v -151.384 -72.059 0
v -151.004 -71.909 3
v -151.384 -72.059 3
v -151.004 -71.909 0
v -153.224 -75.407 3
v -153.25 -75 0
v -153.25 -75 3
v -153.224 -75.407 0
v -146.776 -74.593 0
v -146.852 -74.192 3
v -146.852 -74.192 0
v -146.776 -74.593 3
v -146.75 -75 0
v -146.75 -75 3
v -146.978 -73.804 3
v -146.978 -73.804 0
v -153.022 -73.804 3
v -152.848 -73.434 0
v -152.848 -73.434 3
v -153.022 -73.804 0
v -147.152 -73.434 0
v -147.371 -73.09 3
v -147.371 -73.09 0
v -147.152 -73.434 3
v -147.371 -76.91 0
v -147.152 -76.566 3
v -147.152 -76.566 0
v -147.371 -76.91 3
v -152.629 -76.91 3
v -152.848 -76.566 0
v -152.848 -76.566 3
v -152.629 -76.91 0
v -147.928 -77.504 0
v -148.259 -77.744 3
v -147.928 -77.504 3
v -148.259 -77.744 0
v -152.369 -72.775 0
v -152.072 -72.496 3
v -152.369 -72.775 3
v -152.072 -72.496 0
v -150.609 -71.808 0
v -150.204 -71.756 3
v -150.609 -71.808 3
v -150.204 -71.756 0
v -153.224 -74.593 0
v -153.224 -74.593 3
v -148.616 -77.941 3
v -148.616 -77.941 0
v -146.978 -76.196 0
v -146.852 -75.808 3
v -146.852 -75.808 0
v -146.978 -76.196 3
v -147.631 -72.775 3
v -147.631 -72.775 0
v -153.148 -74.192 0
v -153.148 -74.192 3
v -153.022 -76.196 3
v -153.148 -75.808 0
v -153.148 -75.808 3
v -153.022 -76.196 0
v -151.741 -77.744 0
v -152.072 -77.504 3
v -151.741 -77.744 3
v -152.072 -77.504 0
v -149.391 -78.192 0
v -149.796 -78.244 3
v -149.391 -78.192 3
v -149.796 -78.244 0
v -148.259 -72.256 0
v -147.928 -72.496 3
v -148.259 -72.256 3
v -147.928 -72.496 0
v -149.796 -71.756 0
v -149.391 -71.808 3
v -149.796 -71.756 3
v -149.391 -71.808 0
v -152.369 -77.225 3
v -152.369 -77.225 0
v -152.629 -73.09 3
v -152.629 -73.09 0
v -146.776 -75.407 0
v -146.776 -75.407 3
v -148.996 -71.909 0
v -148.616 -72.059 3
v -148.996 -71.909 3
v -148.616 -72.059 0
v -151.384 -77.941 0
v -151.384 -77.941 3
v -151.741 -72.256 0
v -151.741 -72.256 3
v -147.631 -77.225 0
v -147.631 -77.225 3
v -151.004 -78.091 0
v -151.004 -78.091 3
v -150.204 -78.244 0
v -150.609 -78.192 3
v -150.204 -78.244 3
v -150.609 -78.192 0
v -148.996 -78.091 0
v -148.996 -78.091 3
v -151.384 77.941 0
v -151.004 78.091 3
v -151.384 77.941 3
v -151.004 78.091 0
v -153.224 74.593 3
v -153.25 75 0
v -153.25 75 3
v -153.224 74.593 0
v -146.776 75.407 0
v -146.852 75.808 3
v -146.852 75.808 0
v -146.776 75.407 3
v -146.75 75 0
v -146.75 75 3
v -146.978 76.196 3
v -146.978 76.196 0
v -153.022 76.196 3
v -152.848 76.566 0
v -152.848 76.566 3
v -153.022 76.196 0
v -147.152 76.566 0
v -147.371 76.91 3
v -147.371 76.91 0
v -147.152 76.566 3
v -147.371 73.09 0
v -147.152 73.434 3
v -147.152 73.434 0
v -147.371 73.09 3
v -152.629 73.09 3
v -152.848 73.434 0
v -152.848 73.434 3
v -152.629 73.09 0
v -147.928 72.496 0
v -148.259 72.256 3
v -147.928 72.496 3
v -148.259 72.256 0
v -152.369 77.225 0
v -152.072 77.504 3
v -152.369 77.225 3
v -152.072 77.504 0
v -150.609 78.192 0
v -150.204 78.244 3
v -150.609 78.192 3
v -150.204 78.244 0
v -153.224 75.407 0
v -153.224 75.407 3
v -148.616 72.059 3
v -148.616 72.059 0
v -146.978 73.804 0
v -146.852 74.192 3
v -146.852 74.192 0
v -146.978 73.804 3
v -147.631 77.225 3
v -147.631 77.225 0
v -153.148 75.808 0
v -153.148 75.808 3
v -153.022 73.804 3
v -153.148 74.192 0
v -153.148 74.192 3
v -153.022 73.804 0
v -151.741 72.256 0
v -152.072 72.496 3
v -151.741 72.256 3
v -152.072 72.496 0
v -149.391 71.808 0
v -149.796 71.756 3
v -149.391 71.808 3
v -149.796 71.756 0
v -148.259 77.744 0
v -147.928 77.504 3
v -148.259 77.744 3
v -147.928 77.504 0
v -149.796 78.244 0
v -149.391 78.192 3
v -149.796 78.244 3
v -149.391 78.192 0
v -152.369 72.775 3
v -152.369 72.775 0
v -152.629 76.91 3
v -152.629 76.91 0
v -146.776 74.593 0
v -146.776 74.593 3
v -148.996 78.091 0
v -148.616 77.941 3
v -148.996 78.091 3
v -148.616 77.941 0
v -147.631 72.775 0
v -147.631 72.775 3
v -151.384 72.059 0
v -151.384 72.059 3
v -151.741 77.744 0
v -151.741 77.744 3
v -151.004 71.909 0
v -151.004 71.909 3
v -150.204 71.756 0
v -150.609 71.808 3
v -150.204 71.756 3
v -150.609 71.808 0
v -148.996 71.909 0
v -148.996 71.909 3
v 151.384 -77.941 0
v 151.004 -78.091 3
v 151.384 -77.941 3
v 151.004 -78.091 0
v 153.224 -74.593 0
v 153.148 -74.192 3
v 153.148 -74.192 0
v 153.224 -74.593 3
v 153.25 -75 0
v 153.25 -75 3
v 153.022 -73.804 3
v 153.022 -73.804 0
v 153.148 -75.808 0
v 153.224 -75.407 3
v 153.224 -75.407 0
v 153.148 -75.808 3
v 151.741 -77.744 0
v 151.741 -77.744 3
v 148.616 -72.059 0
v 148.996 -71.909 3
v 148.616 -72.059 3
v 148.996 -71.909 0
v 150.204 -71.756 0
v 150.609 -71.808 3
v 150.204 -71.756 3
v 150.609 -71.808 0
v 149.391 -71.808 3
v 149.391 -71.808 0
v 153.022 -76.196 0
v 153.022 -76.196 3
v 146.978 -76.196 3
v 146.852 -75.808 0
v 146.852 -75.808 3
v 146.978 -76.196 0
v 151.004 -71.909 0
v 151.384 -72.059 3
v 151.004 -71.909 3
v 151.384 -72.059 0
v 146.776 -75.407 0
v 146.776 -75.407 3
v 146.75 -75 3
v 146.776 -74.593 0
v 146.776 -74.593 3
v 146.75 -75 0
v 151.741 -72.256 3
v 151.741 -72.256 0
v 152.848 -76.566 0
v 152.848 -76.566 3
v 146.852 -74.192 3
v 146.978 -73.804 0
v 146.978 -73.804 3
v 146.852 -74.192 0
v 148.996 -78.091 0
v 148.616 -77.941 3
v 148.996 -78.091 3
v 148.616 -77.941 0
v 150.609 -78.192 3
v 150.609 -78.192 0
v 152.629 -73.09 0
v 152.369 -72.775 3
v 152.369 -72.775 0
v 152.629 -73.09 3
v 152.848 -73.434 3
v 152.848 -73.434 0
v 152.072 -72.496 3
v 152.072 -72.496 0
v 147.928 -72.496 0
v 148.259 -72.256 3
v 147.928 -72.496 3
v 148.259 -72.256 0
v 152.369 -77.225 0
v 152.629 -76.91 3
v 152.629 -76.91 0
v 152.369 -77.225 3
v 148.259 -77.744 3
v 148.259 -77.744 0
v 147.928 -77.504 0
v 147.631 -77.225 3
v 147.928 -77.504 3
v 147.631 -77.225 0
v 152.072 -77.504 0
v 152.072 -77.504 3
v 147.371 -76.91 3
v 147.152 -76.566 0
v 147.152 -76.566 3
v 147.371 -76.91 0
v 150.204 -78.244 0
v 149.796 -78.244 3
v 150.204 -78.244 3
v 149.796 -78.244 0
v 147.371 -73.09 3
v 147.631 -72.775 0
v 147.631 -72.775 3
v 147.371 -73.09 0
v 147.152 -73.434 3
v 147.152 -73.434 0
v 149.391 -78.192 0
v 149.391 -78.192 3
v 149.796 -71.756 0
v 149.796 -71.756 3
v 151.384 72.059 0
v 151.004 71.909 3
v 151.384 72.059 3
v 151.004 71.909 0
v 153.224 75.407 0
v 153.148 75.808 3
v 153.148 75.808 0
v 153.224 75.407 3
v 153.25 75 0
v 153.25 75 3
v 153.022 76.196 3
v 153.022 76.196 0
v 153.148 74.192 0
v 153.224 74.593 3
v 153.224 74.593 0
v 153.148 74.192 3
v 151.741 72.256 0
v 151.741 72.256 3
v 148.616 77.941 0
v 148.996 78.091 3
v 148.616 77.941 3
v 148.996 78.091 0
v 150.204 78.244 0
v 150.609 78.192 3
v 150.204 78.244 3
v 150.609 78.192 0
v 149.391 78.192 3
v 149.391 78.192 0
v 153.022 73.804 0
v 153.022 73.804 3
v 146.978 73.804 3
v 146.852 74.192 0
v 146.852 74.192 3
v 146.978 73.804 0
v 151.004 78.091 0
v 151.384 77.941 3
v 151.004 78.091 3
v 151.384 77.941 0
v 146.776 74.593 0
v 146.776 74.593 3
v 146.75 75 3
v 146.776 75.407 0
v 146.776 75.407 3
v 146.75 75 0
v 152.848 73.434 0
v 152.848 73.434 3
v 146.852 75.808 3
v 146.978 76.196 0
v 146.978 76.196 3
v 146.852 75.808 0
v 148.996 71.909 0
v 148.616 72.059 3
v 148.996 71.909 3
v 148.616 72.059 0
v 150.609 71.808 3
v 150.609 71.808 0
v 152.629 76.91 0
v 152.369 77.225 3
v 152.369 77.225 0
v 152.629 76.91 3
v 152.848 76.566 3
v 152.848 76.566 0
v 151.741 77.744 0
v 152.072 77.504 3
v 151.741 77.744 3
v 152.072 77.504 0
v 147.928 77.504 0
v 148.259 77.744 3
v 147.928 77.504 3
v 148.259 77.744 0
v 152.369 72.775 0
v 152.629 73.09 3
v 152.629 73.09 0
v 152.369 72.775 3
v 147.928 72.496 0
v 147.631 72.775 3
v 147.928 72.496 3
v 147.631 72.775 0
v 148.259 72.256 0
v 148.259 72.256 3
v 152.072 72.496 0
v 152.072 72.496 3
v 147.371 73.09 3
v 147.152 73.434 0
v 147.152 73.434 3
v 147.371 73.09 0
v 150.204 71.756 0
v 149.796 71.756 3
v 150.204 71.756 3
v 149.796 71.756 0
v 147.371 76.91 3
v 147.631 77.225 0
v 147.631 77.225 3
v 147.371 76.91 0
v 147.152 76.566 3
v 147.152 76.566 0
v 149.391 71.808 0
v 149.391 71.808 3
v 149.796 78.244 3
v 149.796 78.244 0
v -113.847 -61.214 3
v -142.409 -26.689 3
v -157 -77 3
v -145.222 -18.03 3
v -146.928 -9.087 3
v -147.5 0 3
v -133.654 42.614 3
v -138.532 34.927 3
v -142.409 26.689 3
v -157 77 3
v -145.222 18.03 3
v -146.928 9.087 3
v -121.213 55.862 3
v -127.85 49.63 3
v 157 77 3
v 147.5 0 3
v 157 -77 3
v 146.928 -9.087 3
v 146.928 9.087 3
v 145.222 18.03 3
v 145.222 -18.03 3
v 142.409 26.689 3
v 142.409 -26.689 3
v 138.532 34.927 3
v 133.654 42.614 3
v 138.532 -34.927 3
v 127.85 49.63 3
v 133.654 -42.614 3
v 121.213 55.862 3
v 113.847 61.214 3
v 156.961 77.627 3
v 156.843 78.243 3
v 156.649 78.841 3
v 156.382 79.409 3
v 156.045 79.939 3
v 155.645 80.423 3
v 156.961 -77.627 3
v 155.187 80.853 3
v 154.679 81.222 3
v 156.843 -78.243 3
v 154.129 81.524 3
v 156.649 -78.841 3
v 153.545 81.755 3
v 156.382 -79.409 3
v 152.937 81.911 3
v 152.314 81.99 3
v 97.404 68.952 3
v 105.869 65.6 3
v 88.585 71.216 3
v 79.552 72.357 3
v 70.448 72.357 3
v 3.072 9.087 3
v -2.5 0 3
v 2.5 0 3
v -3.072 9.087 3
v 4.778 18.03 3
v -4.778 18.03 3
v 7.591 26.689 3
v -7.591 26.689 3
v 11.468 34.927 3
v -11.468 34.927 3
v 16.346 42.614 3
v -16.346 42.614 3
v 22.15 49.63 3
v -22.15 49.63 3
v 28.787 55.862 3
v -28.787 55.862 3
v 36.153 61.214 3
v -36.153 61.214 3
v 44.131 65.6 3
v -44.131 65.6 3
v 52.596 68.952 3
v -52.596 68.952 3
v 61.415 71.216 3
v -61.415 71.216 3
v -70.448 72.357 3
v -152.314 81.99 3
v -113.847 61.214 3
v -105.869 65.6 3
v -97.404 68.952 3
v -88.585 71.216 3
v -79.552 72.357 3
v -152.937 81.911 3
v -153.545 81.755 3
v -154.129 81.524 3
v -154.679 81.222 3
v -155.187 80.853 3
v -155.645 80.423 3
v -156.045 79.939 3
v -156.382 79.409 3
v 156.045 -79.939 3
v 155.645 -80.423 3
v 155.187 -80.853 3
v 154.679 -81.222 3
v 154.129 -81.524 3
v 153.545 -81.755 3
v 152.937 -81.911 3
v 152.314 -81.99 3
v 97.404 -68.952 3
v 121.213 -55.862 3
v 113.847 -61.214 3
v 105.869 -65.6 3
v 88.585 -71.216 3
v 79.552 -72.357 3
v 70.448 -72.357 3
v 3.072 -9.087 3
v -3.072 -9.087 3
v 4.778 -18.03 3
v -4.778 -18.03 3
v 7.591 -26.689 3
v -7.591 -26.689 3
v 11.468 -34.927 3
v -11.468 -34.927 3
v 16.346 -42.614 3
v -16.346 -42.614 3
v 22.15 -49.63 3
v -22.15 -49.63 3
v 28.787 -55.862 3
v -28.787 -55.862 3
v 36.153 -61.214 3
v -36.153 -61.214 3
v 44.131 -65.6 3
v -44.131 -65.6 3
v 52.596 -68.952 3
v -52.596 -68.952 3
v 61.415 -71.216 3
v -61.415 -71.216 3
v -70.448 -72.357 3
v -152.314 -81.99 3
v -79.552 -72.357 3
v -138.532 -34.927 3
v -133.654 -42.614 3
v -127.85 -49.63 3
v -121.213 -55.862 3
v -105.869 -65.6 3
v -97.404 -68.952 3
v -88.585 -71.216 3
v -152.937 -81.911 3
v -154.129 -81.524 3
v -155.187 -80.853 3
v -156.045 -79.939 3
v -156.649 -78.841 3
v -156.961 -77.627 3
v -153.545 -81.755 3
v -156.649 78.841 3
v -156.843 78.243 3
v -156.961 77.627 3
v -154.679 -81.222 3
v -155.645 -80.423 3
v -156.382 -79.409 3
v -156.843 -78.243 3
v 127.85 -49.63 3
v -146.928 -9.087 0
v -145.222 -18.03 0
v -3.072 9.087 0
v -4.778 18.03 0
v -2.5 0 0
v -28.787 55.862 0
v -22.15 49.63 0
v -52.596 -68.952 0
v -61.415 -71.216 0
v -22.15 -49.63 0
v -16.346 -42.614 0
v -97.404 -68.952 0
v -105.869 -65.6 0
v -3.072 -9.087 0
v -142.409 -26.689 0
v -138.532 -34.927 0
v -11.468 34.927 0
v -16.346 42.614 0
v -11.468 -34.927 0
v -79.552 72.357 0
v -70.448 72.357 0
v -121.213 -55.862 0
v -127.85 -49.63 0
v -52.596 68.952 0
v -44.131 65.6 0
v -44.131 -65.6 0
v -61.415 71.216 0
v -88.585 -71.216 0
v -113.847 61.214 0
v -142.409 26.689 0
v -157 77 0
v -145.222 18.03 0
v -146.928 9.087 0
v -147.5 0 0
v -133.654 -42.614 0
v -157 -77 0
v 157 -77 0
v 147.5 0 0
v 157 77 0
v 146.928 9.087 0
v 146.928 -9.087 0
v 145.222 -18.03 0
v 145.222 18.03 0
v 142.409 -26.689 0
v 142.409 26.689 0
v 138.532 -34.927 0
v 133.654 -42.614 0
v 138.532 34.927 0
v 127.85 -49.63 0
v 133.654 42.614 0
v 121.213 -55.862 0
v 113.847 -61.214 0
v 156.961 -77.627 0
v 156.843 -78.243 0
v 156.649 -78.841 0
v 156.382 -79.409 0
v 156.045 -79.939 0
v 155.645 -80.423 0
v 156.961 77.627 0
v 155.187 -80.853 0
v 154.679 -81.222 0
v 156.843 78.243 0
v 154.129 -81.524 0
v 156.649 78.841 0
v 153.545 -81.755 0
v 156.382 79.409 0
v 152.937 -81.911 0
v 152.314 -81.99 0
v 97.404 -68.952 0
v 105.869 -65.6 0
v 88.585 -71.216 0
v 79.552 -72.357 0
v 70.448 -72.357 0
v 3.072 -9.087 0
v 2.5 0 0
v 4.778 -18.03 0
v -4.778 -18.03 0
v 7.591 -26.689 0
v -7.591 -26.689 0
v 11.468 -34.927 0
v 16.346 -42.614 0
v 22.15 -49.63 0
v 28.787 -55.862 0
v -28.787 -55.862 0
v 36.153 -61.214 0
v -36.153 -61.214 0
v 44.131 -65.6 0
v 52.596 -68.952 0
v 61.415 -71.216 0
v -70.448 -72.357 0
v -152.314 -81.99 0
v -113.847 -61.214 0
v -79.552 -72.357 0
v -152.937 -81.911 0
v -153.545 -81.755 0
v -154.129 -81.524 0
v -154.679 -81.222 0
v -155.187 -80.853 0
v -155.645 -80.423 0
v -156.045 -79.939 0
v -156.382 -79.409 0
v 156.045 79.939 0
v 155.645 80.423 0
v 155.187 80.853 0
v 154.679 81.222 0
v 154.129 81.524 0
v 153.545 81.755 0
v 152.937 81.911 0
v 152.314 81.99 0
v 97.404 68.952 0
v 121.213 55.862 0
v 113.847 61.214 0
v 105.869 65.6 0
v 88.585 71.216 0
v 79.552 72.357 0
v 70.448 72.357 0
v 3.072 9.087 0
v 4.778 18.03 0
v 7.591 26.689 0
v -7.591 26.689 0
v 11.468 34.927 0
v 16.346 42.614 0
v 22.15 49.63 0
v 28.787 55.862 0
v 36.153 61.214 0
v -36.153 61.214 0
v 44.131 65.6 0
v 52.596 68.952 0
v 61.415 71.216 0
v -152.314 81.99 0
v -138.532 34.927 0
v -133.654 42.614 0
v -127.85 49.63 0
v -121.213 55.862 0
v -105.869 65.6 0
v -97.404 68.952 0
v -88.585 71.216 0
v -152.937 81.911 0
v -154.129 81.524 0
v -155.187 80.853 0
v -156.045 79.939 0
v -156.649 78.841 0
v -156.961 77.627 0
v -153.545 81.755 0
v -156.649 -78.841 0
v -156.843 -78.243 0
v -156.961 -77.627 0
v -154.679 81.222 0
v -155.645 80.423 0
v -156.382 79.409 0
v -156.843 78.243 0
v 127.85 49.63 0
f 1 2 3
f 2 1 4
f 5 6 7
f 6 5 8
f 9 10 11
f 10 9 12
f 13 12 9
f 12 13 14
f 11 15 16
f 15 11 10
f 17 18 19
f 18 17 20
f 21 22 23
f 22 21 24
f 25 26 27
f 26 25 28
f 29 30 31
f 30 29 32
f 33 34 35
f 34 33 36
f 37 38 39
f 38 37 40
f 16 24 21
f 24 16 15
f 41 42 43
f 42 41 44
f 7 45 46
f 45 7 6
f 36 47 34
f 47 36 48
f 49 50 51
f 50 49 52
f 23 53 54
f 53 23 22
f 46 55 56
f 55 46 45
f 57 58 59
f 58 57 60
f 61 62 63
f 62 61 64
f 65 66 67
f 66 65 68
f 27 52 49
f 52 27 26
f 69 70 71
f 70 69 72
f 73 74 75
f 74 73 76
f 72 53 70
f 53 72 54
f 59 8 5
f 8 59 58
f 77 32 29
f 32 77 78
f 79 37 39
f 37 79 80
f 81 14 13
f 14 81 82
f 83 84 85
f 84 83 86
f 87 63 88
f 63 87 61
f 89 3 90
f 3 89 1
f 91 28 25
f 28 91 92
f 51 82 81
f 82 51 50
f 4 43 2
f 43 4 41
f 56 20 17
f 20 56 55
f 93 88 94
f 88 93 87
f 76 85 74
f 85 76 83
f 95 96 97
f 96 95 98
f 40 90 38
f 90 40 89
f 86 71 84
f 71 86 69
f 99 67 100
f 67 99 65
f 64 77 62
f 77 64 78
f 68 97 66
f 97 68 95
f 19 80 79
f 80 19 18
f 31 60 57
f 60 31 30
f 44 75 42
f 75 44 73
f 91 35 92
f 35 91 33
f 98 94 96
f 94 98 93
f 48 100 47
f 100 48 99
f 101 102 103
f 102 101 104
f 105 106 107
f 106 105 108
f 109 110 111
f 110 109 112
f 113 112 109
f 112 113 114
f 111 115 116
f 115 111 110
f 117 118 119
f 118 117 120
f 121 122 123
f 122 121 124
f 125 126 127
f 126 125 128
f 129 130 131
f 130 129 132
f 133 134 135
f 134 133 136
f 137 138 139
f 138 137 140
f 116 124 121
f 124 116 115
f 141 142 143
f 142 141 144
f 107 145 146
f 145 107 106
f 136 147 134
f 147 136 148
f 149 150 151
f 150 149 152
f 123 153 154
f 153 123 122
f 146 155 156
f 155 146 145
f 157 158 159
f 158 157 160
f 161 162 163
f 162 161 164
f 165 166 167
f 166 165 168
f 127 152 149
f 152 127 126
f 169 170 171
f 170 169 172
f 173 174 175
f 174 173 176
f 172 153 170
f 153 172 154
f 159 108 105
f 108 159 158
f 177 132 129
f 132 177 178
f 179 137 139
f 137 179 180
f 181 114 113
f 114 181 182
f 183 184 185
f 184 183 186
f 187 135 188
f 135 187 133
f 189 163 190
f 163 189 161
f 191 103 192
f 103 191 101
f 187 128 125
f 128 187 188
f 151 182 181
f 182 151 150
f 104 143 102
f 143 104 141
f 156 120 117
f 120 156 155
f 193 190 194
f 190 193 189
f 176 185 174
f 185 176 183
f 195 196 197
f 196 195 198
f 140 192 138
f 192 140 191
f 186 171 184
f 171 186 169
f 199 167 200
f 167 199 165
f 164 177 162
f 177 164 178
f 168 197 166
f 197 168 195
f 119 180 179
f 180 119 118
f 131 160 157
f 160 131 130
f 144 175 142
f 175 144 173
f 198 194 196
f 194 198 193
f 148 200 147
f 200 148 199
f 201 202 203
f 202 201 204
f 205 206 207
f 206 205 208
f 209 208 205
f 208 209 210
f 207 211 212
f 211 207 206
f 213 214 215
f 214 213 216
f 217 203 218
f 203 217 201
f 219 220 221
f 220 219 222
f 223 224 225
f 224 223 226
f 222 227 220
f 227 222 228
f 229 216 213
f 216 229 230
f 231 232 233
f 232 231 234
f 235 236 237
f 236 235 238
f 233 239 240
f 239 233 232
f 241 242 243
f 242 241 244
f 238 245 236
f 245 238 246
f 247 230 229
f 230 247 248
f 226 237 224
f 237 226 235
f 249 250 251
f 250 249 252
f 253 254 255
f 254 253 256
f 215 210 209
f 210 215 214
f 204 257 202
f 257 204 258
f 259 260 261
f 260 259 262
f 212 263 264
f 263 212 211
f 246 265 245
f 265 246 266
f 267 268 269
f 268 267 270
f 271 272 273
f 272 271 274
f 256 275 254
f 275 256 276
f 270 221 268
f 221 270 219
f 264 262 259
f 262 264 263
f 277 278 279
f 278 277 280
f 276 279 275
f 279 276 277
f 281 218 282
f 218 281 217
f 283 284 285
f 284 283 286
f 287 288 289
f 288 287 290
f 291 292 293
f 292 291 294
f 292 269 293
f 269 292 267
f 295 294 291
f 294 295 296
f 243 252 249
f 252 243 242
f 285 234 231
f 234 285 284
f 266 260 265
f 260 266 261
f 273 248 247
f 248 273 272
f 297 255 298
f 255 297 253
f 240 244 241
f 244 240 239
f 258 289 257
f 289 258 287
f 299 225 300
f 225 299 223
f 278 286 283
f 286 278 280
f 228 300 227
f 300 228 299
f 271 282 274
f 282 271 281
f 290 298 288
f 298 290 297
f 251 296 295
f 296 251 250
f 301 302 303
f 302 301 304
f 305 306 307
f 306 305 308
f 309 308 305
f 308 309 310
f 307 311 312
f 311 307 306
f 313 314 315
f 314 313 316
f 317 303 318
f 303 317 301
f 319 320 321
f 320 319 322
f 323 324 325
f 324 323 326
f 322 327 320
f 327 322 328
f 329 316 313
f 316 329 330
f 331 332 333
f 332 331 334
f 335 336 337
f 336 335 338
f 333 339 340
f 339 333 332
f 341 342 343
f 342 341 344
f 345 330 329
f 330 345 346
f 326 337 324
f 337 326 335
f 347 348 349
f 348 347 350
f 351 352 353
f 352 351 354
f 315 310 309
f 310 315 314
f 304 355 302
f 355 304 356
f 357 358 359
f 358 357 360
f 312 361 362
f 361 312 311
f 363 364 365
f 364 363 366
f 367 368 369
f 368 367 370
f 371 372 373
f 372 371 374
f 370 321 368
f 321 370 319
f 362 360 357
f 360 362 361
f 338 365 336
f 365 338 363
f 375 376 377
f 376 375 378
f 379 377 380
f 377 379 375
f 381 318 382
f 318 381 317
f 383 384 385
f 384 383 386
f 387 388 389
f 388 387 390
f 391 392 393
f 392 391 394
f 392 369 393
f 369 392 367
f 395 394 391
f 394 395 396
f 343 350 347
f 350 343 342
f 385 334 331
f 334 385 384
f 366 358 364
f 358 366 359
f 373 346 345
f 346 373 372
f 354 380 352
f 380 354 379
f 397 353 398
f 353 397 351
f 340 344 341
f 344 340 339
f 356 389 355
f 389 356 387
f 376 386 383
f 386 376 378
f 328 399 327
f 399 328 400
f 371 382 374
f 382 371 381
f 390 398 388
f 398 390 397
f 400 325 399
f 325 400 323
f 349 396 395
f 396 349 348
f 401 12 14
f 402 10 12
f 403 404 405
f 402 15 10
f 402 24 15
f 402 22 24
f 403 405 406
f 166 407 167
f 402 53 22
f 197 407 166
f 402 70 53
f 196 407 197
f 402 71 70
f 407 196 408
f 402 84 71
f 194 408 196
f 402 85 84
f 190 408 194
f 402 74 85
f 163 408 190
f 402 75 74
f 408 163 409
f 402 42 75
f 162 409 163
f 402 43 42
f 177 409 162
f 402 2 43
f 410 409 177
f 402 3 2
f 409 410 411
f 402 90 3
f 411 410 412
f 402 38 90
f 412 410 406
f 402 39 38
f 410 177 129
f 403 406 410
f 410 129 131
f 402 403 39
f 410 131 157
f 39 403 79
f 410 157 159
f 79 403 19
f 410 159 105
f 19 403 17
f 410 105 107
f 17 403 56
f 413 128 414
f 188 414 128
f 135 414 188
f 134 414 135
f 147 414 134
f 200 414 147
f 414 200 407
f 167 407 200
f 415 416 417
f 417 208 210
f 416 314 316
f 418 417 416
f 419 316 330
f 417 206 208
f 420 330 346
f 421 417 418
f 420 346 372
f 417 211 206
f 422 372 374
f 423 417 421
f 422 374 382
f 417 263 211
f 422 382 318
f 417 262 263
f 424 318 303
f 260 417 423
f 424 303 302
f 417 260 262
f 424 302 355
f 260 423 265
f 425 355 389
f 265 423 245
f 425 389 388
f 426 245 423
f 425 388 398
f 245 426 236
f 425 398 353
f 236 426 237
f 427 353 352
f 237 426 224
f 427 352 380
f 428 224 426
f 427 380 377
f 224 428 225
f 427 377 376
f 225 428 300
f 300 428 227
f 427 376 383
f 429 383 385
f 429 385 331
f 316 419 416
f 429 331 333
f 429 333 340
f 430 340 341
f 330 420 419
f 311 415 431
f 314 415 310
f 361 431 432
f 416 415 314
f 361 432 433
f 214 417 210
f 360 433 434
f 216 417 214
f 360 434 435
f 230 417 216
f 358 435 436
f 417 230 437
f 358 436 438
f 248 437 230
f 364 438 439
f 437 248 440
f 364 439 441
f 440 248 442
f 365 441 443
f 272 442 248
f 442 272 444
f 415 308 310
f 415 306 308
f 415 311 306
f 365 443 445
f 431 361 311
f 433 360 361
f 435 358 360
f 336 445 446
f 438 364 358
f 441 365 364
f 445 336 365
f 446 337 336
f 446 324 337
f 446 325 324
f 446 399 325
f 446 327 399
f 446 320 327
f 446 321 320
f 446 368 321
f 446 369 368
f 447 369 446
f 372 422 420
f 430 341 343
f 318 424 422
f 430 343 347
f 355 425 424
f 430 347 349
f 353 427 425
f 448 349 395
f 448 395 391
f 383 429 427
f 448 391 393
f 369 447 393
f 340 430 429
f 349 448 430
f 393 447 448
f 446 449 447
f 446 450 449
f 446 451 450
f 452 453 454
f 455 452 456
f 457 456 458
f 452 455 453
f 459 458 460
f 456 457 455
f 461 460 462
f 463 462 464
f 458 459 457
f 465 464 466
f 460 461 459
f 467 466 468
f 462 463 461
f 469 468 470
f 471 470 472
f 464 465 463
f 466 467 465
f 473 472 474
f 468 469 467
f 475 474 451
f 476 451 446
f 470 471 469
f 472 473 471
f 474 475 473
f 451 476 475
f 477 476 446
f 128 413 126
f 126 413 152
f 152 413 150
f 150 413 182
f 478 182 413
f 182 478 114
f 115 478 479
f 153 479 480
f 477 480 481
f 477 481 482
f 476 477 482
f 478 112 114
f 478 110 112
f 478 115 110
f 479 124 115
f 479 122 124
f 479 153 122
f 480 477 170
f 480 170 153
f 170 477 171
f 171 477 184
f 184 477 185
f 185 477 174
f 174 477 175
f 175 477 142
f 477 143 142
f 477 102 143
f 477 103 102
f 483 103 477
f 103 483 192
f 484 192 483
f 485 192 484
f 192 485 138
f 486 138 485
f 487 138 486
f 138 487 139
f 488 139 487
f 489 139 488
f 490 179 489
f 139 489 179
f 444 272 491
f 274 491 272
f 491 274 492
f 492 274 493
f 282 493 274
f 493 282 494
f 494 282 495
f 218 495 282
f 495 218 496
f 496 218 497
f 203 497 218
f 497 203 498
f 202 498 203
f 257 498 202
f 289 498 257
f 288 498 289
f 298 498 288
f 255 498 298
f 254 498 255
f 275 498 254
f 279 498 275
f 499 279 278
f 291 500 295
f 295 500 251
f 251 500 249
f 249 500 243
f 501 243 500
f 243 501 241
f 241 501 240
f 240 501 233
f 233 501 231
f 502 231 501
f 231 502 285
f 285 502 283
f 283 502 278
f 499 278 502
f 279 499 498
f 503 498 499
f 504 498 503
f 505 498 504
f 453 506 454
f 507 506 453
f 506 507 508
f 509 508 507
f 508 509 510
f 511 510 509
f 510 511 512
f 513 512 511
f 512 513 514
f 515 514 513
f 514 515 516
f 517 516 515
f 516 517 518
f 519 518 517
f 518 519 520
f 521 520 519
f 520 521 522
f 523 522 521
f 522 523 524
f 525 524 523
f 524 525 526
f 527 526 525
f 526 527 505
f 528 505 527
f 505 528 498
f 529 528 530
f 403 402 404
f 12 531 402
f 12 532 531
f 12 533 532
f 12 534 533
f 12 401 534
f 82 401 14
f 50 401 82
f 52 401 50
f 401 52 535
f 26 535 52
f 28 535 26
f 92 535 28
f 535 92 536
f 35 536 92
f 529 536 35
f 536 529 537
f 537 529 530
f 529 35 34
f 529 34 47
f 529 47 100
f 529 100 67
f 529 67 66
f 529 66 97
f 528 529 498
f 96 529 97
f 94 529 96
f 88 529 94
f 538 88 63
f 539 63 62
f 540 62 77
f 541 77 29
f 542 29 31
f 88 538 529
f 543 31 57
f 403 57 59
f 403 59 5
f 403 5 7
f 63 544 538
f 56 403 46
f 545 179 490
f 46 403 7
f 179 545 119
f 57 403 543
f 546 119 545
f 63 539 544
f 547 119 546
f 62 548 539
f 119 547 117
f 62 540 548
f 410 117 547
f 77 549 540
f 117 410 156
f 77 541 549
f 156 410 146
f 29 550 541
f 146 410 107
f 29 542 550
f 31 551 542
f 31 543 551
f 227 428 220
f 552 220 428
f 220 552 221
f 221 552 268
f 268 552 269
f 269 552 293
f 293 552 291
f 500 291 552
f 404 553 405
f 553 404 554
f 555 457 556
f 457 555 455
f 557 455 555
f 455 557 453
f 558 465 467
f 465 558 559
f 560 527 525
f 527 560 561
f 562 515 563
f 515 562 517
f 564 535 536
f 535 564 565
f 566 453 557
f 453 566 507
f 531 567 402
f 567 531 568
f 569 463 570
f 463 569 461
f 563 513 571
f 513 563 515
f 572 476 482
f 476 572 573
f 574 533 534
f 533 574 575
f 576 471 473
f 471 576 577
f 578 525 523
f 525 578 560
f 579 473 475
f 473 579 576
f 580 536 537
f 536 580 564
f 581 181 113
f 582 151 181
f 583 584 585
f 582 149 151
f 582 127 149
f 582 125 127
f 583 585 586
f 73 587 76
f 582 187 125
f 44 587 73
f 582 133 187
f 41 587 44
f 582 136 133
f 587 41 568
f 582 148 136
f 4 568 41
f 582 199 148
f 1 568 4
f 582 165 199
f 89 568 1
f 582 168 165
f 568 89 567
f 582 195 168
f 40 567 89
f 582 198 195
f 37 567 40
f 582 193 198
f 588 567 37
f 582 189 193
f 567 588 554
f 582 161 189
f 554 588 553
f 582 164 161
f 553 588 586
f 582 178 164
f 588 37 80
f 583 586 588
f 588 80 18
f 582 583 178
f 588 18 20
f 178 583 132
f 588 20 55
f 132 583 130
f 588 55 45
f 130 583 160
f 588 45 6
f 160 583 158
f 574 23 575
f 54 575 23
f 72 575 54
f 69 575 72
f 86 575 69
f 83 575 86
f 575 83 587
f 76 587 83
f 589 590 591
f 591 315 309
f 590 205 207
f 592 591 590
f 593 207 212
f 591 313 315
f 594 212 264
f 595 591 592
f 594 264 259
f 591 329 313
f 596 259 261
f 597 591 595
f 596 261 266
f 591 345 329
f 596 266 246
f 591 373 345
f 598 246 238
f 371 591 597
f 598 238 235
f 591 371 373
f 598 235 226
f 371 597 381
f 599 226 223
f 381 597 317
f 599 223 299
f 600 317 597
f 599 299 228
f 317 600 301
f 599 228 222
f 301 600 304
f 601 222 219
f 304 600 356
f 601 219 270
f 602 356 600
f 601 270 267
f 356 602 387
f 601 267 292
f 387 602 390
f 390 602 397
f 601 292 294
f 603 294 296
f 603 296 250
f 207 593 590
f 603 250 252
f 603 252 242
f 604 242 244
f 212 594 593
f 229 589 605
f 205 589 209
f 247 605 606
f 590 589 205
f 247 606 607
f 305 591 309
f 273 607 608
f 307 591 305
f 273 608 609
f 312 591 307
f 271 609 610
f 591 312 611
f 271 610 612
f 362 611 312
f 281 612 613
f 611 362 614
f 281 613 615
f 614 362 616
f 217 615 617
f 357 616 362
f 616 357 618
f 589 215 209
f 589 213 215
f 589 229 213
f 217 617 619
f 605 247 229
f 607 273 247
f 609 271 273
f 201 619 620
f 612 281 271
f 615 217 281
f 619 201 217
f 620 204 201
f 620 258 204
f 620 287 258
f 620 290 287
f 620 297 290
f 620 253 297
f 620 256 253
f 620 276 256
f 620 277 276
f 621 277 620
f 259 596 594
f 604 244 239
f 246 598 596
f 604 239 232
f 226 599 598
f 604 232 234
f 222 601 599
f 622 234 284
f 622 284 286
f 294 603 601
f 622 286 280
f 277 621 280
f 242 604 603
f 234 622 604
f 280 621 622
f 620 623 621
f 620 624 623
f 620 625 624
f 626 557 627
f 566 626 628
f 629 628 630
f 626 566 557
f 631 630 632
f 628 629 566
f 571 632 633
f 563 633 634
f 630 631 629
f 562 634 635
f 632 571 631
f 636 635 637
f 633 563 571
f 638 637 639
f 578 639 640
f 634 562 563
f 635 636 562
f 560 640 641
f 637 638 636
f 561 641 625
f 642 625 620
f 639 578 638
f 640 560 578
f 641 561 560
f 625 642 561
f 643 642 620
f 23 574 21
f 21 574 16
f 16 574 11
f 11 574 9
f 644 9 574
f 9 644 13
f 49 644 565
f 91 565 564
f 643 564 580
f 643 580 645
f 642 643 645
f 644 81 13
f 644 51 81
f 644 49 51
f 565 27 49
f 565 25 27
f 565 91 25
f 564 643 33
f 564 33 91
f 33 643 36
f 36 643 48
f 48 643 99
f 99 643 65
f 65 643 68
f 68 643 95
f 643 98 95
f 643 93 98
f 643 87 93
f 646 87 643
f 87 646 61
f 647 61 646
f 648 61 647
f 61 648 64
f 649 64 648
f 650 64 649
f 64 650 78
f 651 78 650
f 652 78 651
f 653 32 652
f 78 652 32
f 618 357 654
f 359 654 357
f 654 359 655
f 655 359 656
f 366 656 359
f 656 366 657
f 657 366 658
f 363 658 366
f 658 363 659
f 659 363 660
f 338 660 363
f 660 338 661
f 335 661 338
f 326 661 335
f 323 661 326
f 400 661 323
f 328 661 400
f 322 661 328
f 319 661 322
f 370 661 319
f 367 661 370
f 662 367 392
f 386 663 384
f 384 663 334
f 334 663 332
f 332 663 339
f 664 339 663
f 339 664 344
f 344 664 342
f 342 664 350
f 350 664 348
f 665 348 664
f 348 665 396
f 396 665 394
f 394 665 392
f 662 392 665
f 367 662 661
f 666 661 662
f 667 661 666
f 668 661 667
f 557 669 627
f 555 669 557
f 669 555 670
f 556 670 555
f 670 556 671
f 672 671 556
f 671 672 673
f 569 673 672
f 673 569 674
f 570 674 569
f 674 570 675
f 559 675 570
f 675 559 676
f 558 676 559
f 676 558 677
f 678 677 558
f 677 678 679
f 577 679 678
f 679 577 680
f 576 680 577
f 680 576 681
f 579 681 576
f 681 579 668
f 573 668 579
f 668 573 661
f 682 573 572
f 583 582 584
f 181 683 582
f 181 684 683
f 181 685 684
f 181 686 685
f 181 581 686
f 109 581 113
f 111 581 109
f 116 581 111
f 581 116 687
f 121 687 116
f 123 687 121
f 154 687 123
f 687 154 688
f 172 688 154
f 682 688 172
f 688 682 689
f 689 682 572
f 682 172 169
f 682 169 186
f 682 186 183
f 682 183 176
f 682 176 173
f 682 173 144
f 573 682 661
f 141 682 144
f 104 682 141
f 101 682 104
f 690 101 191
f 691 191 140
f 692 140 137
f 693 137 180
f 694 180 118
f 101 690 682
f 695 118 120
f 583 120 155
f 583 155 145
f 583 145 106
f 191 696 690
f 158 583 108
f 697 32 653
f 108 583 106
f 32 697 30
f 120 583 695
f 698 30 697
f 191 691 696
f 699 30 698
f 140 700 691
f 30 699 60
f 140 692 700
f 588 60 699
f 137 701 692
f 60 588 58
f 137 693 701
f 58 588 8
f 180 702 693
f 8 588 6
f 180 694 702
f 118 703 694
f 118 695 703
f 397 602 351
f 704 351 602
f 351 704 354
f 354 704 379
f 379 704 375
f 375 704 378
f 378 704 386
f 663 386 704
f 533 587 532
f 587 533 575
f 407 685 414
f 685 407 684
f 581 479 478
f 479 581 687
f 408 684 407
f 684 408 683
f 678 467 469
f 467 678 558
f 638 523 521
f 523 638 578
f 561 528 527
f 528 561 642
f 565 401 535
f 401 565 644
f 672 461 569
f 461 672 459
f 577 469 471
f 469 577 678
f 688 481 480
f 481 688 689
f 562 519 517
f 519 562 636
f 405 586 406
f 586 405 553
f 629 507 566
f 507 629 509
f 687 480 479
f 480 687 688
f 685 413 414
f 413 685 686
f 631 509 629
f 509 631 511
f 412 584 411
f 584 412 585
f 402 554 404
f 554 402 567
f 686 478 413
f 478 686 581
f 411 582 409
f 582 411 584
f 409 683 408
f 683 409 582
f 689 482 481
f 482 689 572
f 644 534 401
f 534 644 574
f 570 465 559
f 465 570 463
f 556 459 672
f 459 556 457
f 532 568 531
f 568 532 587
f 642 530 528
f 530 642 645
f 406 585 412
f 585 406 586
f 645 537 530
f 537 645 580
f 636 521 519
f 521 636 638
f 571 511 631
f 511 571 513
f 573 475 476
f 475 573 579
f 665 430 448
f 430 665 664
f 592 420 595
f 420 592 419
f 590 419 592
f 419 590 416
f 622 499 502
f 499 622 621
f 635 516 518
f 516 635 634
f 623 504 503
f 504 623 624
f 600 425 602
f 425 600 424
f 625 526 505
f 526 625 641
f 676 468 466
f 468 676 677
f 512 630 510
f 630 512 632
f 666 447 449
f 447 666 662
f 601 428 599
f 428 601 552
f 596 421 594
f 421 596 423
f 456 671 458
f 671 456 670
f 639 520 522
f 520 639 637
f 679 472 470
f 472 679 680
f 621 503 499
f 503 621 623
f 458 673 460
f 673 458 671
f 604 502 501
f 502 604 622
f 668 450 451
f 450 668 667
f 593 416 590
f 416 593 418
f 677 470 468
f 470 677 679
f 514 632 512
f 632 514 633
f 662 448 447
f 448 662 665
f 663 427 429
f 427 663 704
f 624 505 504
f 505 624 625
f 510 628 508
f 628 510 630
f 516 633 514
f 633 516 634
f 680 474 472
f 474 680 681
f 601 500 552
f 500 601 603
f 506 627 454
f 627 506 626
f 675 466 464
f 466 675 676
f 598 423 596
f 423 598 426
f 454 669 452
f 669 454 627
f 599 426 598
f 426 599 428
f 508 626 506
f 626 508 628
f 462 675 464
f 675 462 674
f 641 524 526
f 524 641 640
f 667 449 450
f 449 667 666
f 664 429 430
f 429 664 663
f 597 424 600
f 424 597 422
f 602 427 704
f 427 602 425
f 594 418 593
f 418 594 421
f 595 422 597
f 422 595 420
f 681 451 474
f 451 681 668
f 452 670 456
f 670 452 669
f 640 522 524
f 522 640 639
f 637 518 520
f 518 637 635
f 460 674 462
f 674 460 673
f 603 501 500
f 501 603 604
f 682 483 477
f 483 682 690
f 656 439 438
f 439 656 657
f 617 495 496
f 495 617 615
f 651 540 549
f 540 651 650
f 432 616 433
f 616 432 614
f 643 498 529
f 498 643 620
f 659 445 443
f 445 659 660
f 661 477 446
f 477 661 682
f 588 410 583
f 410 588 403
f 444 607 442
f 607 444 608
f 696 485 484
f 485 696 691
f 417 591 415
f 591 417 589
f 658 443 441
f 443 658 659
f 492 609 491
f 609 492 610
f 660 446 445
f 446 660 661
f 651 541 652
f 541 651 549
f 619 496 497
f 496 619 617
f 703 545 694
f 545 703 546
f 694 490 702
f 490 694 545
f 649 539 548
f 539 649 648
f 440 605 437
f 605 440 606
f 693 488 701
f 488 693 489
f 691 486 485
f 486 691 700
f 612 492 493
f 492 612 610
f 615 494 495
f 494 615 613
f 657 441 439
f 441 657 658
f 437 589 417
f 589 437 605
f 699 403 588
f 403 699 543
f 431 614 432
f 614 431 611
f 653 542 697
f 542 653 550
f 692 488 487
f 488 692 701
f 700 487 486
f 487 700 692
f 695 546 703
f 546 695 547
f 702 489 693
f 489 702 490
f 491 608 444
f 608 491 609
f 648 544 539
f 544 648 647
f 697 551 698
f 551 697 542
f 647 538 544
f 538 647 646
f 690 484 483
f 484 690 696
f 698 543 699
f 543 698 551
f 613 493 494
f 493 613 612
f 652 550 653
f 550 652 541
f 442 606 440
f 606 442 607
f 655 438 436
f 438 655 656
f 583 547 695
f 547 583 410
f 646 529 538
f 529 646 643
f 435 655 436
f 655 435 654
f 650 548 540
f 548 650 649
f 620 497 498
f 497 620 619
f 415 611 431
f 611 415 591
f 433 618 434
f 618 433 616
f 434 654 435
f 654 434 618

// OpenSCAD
$fn = 50;

difference() {
	union() {
		hull() {
			translate(v = [-152.0, 77.0, 0]) {
				cylinder(h = 3, r = 5);
			}
			translate(v = [152.0, 77.0, 0]) {
				cylinder(h = 3, r = 5);
			}
			translate(v = [-152.0, -77.0, 0]) {
				cylinder(h = 3, r = 5);
			}
			translate(v = [152.0, -77.0, 0]) {
				cylinder(h = 3, r = 5);
			}
		}
	}
	union() {
		translate(v = [-150.0, -75.0, -100.0]) {
			cylinder(h = 200, r = 3.25);
		}
		translate(v = [-150.0, 75.0, -100.0]) {
			cylinder(h = 200, r = 3.25);
		}
		translate(v = [150.0, -75.0, -100.0]) {
			cylinder(h = 200, r = 3.25);
		}
		translate(v = [150.0, 75.0, -100.0]) {
			cylinder(h = 200, r = 3.25);
		}
		translate(v = [-150.0, -75.0, -100.0]) {
			cylinder(h = 200, r = 1.8);
		}
		translate(v = [-150.0, 75.0, -100.0]) {
			cylinder(h = 200, r = 1.8);
		}
		translate(v = [150.0, -75.0, -100.0]) {
			cylinder(h = 200, r = 1.8);
		}
		translate(v = [150.0, 75.0, -100.0]) {
			cylinder(h = 200, r = 1.8);
		}
		translate(v = [-75.0, 0, 0.0]) {
			cylinder(h = 3, r = 72.5);
		}
		translate(v = [75.0, 0, 0.0]) {
			cylinder(h = 3, r = 72.5);
		}
	}
}
